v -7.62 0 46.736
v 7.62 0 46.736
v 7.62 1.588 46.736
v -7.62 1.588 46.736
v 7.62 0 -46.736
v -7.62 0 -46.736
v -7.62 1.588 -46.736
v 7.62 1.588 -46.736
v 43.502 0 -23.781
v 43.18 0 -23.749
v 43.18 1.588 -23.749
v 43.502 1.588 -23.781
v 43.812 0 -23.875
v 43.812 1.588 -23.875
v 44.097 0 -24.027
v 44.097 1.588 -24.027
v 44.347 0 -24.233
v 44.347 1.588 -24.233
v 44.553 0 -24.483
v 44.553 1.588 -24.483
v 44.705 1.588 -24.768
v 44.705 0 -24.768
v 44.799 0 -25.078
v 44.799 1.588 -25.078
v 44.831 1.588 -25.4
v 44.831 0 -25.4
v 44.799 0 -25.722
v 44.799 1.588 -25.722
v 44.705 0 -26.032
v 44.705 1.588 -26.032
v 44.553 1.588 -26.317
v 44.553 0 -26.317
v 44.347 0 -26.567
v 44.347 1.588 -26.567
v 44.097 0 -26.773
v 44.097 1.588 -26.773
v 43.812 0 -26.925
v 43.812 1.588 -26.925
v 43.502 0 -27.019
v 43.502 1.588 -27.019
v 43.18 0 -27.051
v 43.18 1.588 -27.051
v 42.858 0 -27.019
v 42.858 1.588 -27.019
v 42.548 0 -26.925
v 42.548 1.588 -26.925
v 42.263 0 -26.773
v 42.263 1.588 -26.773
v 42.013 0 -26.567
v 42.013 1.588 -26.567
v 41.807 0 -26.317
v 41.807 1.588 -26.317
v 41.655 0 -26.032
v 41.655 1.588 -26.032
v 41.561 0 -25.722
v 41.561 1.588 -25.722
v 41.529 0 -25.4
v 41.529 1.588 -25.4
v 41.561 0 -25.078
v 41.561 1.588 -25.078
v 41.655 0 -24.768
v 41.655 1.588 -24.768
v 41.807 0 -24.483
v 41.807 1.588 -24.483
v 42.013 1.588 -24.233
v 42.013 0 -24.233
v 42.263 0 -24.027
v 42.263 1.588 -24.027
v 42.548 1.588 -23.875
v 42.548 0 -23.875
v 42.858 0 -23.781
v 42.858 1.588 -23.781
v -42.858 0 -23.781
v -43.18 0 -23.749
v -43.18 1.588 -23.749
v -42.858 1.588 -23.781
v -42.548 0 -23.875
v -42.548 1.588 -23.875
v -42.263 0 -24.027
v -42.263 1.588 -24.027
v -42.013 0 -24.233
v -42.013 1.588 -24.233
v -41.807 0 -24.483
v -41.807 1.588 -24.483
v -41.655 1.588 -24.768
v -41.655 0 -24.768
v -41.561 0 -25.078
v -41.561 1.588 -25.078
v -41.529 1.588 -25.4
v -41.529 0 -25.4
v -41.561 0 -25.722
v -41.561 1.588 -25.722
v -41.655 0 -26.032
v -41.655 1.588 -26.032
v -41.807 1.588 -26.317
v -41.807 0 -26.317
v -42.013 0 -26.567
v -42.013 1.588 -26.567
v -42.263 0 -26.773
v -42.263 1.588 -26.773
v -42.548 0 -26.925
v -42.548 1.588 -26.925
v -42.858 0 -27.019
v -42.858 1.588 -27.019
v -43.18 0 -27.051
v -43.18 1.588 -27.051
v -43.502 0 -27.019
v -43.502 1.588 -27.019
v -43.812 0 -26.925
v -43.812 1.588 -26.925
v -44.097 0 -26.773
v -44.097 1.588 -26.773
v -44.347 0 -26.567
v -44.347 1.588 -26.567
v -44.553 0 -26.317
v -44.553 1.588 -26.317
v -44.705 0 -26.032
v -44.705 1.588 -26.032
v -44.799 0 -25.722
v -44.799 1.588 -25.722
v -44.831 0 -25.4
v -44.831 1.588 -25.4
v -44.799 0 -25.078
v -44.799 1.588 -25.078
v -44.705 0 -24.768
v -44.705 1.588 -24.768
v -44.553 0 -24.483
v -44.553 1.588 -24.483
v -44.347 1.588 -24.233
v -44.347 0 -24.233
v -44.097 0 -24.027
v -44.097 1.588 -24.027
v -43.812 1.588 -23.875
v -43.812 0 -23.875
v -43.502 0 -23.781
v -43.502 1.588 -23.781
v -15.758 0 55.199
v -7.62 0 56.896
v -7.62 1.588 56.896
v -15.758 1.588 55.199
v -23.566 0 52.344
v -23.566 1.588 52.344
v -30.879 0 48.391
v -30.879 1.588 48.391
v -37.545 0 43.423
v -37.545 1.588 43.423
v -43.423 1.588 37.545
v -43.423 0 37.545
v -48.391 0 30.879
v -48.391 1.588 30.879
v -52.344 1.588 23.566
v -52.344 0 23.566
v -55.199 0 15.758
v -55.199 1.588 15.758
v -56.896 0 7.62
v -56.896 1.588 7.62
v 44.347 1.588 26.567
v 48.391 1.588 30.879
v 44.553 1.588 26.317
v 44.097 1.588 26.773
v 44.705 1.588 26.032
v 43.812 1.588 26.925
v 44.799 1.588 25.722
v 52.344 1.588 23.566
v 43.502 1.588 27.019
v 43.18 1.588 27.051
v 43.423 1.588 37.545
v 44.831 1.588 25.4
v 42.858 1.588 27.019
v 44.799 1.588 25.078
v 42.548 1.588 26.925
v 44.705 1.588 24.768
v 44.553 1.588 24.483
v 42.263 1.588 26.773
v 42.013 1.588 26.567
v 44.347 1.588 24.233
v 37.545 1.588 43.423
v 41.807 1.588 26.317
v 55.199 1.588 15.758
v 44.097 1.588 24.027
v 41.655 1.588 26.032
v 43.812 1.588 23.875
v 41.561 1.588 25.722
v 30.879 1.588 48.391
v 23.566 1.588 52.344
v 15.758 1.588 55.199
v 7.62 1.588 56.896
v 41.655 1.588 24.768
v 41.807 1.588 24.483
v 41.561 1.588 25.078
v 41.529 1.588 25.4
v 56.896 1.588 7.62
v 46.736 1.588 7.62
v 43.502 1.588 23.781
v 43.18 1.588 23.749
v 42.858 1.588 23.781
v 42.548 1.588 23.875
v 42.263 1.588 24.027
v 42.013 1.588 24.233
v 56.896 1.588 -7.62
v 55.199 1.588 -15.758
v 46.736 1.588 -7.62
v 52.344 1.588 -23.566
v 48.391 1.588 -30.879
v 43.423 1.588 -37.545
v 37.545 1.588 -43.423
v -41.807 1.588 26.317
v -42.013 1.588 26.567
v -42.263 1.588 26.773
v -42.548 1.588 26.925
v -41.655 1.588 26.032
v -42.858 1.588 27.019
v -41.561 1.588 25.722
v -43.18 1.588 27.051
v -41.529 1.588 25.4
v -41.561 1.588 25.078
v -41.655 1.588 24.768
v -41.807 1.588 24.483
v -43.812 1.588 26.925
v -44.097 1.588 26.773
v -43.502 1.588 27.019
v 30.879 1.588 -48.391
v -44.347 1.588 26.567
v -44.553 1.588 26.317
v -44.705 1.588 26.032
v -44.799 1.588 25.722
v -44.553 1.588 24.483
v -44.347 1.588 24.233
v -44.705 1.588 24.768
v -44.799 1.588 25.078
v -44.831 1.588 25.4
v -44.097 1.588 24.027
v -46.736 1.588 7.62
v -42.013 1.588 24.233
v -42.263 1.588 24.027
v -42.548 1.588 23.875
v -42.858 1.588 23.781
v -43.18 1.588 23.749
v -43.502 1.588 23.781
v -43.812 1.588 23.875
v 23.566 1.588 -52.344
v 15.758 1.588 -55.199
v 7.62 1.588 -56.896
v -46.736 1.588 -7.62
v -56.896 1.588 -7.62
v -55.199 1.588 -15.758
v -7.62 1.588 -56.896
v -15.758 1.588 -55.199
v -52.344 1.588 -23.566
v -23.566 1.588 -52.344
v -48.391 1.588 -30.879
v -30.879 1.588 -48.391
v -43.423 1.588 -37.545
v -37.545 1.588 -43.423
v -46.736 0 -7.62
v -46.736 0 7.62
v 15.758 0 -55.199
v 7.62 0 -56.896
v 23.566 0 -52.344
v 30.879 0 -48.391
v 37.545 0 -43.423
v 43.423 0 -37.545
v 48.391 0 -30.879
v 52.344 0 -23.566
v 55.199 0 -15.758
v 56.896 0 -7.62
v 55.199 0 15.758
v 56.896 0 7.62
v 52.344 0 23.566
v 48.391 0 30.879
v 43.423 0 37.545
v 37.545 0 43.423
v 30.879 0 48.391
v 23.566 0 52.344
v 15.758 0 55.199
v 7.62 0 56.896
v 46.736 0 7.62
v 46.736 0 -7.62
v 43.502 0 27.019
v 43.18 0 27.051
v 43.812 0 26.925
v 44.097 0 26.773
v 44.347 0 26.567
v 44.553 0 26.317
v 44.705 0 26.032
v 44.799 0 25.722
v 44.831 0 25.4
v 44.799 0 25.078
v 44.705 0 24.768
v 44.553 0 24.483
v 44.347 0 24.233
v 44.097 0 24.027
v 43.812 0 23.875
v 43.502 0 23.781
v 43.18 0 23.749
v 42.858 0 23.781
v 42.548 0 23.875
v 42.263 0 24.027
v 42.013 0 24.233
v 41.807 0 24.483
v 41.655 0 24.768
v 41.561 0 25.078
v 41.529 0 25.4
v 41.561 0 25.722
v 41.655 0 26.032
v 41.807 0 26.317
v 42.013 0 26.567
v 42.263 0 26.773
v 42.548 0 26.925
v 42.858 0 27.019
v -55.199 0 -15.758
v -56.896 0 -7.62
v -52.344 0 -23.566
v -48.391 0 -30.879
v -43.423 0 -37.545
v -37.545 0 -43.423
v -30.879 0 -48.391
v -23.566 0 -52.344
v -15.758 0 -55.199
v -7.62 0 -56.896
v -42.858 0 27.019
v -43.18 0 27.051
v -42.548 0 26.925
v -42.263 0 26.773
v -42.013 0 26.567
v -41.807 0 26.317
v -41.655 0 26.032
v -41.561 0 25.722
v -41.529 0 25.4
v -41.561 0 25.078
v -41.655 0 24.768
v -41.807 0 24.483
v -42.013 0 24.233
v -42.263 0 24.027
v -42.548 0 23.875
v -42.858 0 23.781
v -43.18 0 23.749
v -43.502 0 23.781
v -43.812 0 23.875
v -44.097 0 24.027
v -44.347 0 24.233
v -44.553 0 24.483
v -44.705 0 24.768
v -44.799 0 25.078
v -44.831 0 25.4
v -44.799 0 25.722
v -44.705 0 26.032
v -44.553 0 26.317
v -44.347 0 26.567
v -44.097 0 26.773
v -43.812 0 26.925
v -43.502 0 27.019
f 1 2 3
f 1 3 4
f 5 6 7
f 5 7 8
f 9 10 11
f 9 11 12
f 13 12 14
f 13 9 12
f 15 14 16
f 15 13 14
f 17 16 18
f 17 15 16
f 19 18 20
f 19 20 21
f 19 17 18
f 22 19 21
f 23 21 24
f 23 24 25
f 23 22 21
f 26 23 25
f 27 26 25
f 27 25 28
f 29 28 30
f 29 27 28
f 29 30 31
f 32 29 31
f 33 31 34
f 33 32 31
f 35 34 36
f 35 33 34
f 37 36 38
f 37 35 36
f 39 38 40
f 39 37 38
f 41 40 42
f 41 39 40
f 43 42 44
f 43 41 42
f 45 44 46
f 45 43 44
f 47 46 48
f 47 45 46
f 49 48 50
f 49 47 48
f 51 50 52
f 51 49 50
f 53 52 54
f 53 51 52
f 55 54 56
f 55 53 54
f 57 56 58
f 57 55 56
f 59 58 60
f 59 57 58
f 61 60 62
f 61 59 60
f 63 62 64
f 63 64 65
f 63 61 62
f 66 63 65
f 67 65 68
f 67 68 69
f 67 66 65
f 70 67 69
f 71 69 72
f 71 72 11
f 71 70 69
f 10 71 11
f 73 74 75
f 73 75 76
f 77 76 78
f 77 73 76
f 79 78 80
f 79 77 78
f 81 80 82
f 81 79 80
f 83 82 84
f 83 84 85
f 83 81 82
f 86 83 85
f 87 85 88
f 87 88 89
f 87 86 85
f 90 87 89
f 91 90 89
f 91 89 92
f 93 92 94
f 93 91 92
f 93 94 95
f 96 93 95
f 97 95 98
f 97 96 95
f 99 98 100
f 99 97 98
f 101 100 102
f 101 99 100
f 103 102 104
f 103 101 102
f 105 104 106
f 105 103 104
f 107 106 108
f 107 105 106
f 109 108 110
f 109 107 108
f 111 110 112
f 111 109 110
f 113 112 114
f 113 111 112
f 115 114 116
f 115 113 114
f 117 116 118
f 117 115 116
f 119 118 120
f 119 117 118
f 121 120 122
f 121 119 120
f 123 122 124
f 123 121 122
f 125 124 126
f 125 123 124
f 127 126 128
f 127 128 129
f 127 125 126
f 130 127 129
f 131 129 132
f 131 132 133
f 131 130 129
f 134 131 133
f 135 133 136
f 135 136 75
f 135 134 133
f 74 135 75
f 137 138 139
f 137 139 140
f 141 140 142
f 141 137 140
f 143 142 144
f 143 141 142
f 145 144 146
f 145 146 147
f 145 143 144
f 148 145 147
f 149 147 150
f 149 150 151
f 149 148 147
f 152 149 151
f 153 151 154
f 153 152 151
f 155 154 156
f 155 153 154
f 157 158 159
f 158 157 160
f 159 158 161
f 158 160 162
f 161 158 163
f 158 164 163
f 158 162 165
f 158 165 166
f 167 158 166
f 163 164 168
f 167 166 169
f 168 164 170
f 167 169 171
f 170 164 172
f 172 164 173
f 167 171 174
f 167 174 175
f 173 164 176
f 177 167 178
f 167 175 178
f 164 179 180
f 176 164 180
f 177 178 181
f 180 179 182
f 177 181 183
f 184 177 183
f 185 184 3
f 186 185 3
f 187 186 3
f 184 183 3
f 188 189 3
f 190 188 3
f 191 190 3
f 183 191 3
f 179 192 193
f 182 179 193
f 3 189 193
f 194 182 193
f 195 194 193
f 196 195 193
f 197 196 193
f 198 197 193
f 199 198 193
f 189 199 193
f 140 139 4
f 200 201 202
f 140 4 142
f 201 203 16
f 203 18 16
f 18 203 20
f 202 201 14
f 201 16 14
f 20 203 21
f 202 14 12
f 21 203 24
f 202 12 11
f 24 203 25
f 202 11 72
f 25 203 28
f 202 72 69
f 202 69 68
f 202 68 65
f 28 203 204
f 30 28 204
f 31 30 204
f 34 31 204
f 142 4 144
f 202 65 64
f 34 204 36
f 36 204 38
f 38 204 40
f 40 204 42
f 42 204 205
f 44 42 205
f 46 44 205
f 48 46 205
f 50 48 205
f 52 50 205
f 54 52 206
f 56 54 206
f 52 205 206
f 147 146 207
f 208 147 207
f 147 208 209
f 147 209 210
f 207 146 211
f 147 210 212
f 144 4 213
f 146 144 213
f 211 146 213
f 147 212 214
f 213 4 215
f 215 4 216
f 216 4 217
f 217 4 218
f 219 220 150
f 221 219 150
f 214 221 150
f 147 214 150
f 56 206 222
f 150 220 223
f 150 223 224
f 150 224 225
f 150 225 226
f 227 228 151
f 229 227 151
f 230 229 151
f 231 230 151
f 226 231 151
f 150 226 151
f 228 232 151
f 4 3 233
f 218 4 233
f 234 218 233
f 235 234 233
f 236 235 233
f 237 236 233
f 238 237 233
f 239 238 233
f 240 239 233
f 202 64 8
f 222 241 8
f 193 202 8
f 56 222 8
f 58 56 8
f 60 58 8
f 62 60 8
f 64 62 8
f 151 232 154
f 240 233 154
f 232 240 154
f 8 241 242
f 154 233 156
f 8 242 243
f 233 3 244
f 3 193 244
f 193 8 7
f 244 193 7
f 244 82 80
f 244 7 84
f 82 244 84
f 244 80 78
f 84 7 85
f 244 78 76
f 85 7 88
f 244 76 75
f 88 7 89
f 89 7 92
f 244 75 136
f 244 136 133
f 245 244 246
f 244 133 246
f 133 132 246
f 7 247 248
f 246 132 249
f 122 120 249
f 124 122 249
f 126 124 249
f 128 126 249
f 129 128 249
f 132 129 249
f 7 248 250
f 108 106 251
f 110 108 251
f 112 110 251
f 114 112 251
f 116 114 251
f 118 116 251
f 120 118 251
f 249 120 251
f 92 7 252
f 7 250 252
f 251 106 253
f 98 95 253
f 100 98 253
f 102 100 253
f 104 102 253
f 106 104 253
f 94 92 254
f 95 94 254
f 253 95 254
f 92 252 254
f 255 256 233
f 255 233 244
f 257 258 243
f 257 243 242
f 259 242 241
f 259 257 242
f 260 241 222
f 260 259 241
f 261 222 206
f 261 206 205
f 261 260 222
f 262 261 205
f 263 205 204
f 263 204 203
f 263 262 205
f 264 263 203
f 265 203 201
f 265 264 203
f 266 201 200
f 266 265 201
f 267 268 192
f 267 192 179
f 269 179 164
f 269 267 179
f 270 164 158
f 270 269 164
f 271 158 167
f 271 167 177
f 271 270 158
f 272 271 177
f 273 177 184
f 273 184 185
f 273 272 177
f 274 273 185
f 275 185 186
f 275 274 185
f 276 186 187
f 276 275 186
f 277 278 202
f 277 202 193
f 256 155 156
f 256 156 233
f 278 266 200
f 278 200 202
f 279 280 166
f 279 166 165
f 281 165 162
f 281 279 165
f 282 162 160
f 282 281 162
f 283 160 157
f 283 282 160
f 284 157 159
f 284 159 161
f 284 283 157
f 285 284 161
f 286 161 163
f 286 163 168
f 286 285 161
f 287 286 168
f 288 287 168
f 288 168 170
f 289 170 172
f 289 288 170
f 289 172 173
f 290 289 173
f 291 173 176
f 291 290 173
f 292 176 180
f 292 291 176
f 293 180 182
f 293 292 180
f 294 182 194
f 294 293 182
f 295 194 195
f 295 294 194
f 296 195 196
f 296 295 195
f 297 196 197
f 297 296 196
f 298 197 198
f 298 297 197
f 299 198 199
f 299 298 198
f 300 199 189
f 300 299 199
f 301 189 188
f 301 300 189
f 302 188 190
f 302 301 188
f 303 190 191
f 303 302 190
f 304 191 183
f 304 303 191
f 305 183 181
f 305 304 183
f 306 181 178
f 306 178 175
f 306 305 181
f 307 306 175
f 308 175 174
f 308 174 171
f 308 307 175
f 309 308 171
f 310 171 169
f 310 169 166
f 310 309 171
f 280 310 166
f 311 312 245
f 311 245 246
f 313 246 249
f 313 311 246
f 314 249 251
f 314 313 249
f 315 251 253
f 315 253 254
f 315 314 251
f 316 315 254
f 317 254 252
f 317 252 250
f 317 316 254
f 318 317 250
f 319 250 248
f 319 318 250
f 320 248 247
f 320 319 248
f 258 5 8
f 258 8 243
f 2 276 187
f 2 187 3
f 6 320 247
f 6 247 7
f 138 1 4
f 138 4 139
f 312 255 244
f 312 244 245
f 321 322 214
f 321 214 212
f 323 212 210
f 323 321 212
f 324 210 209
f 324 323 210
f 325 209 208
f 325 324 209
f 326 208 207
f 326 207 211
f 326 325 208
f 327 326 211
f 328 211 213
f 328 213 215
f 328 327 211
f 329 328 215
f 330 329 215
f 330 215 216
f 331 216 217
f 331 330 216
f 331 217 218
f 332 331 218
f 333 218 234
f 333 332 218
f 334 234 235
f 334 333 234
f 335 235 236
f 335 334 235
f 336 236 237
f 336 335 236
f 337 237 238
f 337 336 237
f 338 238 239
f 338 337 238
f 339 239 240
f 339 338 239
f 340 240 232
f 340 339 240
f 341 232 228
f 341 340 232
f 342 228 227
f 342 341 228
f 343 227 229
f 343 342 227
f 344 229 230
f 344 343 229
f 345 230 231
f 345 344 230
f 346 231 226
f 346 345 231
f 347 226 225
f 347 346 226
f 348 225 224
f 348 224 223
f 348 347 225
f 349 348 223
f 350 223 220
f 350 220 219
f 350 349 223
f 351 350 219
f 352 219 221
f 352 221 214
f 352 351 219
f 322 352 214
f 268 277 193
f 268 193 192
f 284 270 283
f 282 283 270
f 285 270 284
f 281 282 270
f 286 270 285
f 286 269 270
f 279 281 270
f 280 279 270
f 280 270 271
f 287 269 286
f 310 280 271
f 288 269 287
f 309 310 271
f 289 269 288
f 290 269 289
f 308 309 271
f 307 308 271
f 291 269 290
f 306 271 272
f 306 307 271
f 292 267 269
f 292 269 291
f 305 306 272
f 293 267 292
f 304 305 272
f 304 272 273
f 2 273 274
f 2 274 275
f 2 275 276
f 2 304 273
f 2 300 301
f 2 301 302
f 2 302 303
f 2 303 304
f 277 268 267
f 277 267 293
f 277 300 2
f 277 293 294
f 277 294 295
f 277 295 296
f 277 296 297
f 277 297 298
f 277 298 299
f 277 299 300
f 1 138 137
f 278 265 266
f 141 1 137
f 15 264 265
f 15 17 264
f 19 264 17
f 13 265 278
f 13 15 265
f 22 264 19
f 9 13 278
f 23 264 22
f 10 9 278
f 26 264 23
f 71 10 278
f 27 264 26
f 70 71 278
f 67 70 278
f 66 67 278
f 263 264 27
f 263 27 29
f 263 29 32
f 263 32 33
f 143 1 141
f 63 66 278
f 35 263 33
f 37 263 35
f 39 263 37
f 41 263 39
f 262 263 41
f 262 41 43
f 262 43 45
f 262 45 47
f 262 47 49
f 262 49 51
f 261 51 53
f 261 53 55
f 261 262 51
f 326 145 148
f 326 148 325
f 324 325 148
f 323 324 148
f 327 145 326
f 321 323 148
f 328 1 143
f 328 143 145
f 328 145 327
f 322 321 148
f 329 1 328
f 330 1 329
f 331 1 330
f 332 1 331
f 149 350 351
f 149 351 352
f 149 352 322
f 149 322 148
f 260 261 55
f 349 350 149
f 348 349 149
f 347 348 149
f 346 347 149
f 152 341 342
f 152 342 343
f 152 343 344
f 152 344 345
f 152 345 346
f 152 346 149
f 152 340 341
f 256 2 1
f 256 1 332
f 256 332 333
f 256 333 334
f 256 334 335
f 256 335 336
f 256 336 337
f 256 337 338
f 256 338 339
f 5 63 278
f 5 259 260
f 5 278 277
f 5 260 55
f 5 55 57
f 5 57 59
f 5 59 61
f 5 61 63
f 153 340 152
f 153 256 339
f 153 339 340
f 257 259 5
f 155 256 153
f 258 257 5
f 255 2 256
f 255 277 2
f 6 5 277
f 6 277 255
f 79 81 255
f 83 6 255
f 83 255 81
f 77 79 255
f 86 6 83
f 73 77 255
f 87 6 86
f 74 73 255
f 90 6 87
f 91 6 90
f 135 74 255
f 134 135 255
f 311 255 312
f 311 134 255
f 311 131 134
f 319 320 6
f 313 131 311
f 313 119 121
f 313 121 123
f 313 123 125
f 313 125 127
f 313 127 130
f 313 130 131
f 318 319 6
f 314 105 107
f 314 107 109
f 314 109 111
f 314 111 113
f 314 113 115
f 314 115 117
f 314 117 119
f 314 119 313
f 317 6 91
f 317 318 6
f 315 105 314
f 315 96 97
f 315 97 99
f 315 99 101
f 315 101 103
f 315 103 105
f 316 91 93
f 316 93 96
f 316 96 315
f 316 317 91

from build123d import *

# Parameters (mm, degrees)
SKETCH1_R           = 1.651
BOSS_EXTRUDE1_DEPTH = 1.5875


with BuildPart() as part:
    # Sketch1 → Boss-Extrude1 (new body)
    with BuildSketch(Plane(origin=(0, 0, 0), x_dir=(1, 0, 0), z_dir=(0, 1, 0))):
        with BuildLine():
            Line((-7.62, 56.896), (-7.62, 46.736))
            Line((-7.62, 46.736), (7.62, 46.736))
            Line((7.62, 46.736), (7.62, 56.896))
            ThreePointArc((7.62, 56.896), (40.590757667, 40.590757667), (56.896, 7.62))
            Line((56.896, 7.62), (46.736, 7.62))
            Line((46.736, 7.62), (46.736, -7.62))
            Line((46.736, -7.62), (56.896, -7.62))
            ThreePointArc((56.896, -7.62), (40.590757667, -40.590757667), (7.62, -56.896))
            Line((7.62, -56.896), (7.62, -46.736))
            Line((7.62, -46.736), (-7.62, -46.736))
            Line((-7.62, -46.736), (-7.62, -56.896))
            ThreePointArc((-7.62, -56.896), (-40.590757667, -40.590757667), (-56.896, -7.62))
            Line((-56.896, -7.62), (-46.736, -7.62))
            Line((-46.736, -7.62), (-46.736, 7.62))
            Line((-46.736, 7.62), (-56.896, 7.62))
            ThreePointArc((-56.896, 7.62), (-40.590757667, 40.590757667), (-7.62, 56.896))
        make_face()
        with Locations(Location((-43.18, 25.4, 0), (0, 0, 270))):
            Circle(SKETCH1_R, mode=Mode.SUBTRACT)
        with Locations(Location((-43.18, -25.4, 0), (0, 0, 270))):
            Circle(SKETCH1_R, mode=Mode.SUBTRACT)
        with Locations(Location((43.18, -25.4, 0), (0, 0, 270))):
            Circle(SKETCH1_R, mode=Mode.SUBTRACT)
        with Locations(Location((43.18, 25.4, 0), (0, 0, 270))):
            Circle(SKETCH1_R, mode=Mode.SUBTRACT)
    extrude(amount=BOSS_EXTRUDE1_DEPTH)


solid = part.part
